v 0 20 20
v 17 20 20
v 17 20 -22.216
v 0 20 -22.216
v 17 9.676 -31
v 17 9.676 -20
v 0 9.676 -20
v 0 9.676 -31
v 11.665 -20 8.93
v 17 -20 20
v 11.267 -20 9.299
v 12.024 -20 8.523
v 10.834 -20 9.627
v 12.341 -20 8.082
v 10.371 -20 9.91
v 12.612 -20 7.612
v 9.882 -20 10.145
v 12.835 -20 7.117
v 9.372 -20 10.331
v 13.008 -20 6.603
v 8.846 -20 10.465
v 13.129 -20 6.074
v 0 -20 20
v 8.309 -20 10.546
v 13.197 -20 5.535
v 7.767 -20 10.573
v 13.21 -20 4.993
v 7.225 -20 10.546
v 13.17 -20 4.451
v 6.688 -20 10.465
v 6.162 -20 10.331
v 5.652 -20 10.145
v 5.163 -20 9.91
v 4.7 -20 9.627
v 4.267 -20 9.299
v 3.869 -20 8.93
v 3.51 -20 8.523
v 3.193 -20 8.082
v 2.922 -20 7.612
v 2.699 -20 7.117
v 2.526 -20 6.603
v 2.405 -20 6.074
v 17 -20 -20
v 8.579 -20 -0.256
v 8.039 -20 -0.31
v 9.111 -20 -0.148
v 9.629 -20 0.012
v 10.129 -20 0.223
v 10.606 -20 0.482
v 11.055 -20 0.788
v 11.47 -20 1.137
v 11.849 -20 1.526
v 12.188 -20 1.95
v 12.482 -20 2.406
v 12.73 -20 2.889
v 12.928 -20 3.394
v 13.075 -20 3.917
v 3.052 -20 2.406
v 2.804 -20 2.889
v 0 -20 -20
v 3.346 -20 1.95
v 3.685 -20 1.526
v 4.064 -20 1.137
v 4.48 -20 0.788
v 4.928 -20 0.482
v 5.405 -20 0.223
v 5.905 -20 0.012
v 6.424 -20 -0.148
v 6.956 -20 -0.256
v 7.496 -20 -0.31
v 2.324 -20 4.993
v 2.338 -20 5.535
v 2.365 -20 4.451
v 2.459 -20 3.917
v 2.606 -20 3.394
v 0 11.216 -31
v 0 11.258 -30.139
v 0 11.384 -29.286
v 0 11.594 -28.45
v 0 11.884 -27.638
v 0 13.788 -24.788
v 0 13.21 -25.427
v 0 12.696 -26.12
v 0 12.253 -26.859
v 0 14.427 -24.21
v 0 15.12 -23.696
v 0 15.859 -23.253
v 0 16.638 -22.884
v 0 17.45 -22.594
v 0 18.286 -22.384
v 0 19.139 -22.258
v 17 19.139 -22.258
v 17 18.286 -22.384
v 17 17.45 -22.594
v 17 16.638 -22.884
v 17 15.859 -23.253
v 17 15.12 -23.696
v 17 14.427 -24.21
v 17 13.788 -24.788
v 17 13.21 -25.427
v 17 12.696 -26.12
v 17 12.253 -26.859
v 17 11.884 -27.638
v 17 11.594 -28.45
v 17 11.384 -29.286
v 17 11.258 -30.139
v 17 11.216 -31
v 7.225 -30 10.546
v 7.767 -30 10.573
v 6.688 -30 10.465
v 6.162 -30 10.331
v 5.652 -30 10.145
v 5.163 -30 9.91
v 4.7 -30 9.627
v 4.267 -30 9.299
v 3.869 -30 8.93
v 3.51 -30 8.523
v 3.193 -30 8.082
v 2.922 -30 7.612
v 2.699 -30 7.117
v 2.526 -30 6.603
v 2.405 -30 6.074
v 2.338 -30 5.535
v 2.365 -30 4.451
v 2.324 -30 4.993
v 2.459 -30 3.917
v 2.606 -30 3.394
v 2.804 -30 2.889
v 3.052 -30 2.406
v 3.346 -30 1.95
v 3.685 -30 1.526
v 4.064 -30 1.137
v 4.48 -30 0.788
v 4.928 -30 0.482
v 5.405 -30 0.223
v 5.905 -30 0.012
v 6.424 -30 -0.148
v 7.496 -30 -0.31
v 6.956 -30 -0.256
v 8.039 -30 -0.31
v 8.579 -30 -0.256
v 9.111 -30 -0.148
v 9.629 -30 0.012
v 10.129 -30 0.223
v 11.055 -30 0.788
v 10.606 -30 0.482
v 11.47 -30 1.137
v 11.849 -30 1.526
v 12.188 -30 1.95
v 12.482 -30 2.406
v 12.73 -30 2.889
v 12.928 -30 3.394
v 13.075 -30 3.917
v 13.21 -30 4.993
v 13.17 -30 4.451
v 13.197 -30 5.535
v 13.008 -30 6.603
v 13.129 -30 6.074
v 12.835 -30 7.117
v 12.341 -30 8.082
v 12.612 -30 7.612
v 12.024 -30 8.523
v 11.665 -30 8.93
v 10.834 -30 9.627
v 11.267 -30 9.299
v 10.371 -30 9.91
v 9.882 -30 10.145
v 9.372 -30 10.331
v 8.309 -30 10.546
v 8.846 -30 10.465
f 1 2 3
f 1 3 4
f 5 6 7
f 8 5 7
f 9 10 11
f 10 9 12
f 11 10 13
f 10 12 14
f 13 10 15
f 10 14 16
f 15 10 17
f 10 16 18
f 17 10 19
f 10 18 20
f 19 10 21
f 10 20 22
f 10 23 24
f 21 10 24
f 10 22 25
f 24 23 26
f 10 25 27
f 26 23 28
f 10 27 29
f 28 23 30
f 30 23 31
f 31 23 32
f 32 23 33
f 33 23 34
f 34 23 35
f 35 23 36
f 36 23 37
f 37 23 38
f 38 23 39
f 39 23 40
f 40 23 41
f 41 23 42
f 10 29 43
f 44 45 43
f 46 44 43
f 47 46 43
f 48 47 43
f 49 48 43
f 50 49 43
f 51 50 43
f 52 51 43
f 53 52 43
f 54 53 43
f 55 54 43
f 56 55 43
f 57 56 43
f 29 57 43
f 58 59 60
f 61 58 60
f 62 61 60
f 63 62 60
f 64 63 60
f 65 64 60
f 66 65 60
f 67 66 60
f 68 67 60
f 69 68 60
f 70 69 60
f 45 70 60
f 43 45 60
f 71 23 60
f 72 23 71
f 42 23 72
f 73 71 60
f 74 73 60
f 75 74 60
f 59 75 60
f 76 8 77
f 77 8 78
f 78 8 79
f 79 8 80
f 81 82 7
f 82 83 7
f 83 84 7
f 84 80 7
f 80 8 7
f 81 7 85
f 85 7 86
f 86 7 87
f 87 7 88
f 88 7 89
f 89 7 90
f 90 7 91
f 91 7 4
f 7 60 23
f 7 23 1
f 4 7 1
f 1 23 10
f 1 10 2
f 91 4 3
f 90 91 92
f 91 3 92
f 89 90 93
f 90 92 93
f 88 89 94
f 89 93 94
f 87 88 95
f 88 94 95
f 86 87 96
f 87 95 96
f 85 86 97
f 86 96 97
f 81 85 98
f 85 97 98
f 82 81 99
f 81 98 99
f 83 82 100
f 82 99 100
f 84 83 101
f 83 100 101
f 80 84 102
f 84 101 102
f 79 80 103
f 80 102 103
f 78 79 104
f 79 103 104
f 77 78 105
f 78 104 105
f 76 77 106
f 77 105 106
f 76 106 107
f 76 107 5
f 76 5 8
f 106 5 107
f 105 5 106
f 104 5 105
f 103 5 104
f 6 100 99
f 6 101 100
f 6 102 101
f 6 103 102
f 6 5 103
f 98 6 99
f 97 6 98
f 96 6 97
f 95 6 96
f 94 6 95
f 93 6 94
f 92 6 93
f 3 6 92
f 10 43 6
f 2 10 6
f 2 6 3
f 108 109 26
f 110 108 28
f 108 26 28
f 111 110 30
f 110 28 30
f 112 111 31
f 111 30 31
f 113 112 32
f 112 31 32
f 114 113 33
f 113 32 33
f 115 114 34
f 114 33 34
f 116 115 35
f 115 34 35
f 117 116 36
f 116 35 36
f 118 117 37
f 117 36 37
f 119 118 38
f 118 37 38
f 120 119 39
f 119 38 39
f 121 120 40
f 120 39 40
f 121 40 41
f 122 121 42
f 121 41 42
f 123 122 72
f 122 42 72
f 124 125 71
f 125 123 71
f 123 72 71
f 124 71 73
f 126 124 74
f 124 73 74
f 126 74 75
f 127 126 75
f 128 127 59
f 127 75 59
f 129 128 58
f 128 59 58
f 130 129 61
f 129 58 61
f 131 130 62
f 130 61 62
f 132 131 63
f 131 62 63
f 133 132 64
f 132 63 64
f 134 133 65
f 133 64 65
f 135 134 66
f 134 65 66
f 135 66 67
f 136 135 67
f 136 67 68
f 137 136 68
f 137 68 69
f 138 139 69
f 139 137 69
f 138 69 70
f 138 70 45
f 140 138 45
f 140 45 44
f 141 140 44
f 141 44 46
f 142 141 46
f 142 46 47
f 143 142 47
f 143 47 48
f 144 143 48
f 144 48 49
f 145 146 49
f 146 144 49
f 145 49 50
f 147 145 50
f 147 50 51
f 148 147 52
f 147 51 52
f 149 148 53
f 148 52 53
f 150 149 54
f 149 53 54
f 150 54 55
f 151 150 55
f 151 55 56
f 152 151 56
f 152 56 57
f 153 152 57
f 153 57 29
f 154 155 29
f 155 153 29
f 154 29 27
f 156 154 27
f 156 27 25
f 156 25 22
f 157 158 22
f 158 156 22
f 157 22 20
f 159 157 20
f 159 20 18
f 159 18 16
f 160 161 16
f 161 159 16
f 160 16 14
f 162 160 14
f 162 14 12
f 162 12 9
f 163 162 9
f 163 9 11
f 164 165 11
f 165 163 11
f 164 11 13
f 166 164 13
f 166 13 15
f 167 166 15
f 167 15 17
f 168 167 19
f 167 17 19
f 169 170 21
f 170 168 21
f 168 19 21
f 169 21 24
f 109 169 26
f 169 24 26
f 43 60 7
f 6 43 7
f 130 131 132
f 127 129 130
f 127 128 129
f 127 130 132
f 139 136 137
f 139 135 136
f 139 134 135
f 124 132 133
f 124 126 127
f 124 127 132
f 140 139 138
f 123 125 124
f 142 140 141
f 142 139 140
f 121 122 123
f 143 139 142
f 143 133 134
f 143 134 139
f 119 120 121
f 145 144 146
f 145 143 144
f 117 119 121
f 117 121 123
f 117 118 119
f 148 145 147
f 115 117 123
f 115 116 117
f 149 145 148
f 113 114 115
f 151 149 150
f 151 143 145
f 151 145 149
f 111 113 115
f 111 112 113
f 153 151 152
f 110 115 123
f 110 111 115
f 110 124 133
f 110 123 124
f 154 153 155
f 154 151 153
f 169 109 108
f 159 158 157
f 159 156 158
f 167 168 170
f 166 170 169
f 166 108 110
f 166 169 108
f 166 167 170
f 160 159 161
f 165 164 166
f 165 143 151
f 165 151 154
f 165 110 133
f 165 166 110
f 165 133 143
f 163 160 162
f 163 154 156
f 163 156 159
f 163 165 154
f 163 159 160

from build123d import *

# Parameters (mm, degrees)
SKETCH_1_W          = 40
SKETCH_1_H          = 40
EXTRUDE_1_DEPTH     = 17
SKETCH_2_W          = 39
SKETCH_2_H          = 39
EXTRUDE_2_DEPTH     = 11
SKETCH_3_W          = 2
SKETCH_3_H          = 39
CUT_EXTRUDE_1_DEPTH = 9
EXTRUDE_3_DEPTH     = 11
SKETCH_5_R          = 5.444681892
EXTRUDE_4_DEPTH     = 11
SKETCH_6_W          = 25
SKETCH_6_H          = 17.382728094
EXTRUDE_5_DEPTH     = 11
SKETCH_7_R          = 4.5
EXTRUDE_6_DEPTH     = 11
EXTRUDE_6_TAPER     = 17
SKETCH_8_W          = 17
SKETCH_8_H          = 10.324195756
EXTRUDE_7_DEPTH     = 11
SKETCH_9_R          = 8.784415214
CUT_EXTRUDE_2_DEPTH = 27
CUT_EXTRUDE_START   = 10
SKETCH_10_W         = 58.477636184
SKETCH_10_H         = 70.793077964
CUT_EXTRUDE_3_DEPTH = 47
SKETCH_11_W         = 62.750592471
SKETCH_11_H         = 80.218393182
CUT_EXTRUDE_4_DEPTH = 22


with BuildPart() as part:
    # Эскиз1 → Бобышка-Вытянуть1 (new body)
    with BuildSketch(Plane(origin=(0, 0, 0), x_dir=(0, 0, -1), z_dir=(1, 0, 0))):
        Rectangle(SKETCH_1_W, SKETCH_1_H)
    extrude(amount=EXTRUDE_1_DEPTH)

    # Эскиз2 → Бобышка-Вытянуть2 (add)
    with BuildSketch(Plane(origin=(17, 0, 0), x_dir=(0, 0, -1), z_dir=(1, 0, 0))):
        Rectangle(SKETCH_2_W, SKETCH_2_H)
    extrude(amount=EXTRUDE_2_DEPTH)

    # Эскиз3 → Вырез-Вытянуть1 (cut)
    with BuildSketch(Plane(origin=(28, 0, 0), x_dir=(0, 0, -1), z_dir=(1, 0, 0))):
        with Locations((-16, 0)):
            Rectangle(SKETCH_3_W, SKETCH_3_H)
        with Locations((-12, 0)):
            Rectangle(SKETCH_3_W, SKETCH_3_H)
        with Locations((-8, 0)):
            Rectangle(SKETCH_3_W, SKETCH_3_H)
        with Locations((-4, 0)):
            Rectangle(SKETCH_3_W, SKETCH_3_H)
        Rectangle(SKETCH_3_W, SKETCH_3_H)
        with Locations((4, 0)):
            Rectangle(SKETCH_3_W, SKETCH_3_H)
        with Locations((8, 0)):
            Rectangle(SKETCH_3_W, SKETCH_3_H)
        with Locations((12, 0)):
            Rectangle(SKETCH_3_W, SKETCH_3_H)
        with Locations((16, 0)):
            Rectangle(SKETCH_3_W, SKETCH_3_H)
    extrude(amount=-CUT_EXTRUDE_1_DEPTH, mode=Mode.SUBTRACT)

    # Эскиз4 → Бобышка-Вытянуть3 (add)
    with BuildSketch(Plane(origin=(28, 0, 0), x_dir=(0, 0, -1), z_dir=(1, 0, 0))):
        with BuildLine():
            Line((13.94108797, 18.534083609), (-13.965803425, 18.534083609))
            ThreePointArc((-13.965803425, 18.534083609), (-17.501337331, 17.069617515), (-18.965803425, 13.534083609))
            Line((-18.965803425, 13.534083609), (-18.965803425, -13.794341936))
            ThreePointArc((-18.965803425, -13.794341936), (-17.501337331, -17.329875842), (-13.965803425, -18.794341936))
            Line((-13.965803425, -18.794341936), (13.94108797, -18.794341936))
            ThreePointArc((13.94108797, -18.794341936), (17.476621876, -17.329875842), (18.94108797, -13.794341936))
            Line((18.94108797, -13.794341936), (18.94108797, 13.534083609))
            ThreePointArc((18.94108797, 13.534083609), (17.476621876, 17.069617515), (13.94108797, 18.534083609))
        make_face()
    extrude(amount=EXTRUDE_3_DEPTH)

    # Эскиз5 → Бобышка-Вытянуть4 (add)
    with BuildSketch(Plane.XZ.offset(20)):
        with Locations(Location((7.767128211, 5.128320155, 0), (0, 0, 90))):
            Circle(SKETCH_5_R)
    extrude(amount=EXTRUDE_4_DEPTH)

    # Эскиз6 → Бобышка-Вытянуть5 (add)
    with BuildSketch(Plane.XZ.offset(31)):
        with Locations((10.668319864, 5.154067921)):
            Rectangle(SKETCH_6_W, SKETCH_6_H)
    extrude(amount=EXTRUDE_5_DEPTH)

    # Эскиз7 → Бобышка-Вытянуть6 (add)
    with BuildSketch(Plane.XZ.offset(42)):
        with Locations((7.710138854, 5.107455984)):
            Circle(SKETCH_7_R)
    extrude(amount=EXTRUDE_6_DEPTH, taper=EXTRUDE_6_TAPER)

    # Эскиз8 → Бобышка-Вытянуть7 (add)
    with BuildSketch(Plane(origin=(0, 0, -20), x_dir=(-1, 0, 0), z_dir=(0, 0, -1))):
        with Locations((-8.5, 14.837902122)):
            Rectangle(SKETCH_8_W, SKETCH_8_H)
    extrude(amount=EXTRUDE_7_DEPTH)

    # Эскиз9 → Вырез-Вытянуть2 (cut)
    with BuildSketch(Plane(origin=(17, 0, 0), x_dir=(0, 0, -1), z_dir=(1, 0, 0))):
        with Locations((31, 20)):
            Circle(SKETCH_9_R)
    extrude(amount=-CUT_EXTRUDE_2_DEPTH, mode=Mode.SUBTRACT)

    # Эскиз10 → Вырез-Вытянуть3 (cut)
    with BuildSketch(Plane.XZ.offset(20).offset(CUT_EXTRUDE_START)):
        with Locations((4.776161953, -4.159448177)):
            Rectangle(SKETCH_10_W, SKETCH_10_H)
    extrude(amount=CUT_EXTRUDE_3_DEPTH, mode=Mode.SUBTRACT)

    # Эскиз11 → Вырез-Вытянуть4 (cut)
    with BuildSketch(Plane(origin=(39, 0, 0), x_dir=(0, 0, -1), z_dir=(1, 0, 0))):
        with Locations((5.568785854, 6.666933577)):
            Rectangle(SKETCH_11_W, SKETCH_11_H)
    extrude(amount=-CUT_EXTRUDE_4_DEPTH, mode=Mode.SUBTRACT)


solid = part.part
